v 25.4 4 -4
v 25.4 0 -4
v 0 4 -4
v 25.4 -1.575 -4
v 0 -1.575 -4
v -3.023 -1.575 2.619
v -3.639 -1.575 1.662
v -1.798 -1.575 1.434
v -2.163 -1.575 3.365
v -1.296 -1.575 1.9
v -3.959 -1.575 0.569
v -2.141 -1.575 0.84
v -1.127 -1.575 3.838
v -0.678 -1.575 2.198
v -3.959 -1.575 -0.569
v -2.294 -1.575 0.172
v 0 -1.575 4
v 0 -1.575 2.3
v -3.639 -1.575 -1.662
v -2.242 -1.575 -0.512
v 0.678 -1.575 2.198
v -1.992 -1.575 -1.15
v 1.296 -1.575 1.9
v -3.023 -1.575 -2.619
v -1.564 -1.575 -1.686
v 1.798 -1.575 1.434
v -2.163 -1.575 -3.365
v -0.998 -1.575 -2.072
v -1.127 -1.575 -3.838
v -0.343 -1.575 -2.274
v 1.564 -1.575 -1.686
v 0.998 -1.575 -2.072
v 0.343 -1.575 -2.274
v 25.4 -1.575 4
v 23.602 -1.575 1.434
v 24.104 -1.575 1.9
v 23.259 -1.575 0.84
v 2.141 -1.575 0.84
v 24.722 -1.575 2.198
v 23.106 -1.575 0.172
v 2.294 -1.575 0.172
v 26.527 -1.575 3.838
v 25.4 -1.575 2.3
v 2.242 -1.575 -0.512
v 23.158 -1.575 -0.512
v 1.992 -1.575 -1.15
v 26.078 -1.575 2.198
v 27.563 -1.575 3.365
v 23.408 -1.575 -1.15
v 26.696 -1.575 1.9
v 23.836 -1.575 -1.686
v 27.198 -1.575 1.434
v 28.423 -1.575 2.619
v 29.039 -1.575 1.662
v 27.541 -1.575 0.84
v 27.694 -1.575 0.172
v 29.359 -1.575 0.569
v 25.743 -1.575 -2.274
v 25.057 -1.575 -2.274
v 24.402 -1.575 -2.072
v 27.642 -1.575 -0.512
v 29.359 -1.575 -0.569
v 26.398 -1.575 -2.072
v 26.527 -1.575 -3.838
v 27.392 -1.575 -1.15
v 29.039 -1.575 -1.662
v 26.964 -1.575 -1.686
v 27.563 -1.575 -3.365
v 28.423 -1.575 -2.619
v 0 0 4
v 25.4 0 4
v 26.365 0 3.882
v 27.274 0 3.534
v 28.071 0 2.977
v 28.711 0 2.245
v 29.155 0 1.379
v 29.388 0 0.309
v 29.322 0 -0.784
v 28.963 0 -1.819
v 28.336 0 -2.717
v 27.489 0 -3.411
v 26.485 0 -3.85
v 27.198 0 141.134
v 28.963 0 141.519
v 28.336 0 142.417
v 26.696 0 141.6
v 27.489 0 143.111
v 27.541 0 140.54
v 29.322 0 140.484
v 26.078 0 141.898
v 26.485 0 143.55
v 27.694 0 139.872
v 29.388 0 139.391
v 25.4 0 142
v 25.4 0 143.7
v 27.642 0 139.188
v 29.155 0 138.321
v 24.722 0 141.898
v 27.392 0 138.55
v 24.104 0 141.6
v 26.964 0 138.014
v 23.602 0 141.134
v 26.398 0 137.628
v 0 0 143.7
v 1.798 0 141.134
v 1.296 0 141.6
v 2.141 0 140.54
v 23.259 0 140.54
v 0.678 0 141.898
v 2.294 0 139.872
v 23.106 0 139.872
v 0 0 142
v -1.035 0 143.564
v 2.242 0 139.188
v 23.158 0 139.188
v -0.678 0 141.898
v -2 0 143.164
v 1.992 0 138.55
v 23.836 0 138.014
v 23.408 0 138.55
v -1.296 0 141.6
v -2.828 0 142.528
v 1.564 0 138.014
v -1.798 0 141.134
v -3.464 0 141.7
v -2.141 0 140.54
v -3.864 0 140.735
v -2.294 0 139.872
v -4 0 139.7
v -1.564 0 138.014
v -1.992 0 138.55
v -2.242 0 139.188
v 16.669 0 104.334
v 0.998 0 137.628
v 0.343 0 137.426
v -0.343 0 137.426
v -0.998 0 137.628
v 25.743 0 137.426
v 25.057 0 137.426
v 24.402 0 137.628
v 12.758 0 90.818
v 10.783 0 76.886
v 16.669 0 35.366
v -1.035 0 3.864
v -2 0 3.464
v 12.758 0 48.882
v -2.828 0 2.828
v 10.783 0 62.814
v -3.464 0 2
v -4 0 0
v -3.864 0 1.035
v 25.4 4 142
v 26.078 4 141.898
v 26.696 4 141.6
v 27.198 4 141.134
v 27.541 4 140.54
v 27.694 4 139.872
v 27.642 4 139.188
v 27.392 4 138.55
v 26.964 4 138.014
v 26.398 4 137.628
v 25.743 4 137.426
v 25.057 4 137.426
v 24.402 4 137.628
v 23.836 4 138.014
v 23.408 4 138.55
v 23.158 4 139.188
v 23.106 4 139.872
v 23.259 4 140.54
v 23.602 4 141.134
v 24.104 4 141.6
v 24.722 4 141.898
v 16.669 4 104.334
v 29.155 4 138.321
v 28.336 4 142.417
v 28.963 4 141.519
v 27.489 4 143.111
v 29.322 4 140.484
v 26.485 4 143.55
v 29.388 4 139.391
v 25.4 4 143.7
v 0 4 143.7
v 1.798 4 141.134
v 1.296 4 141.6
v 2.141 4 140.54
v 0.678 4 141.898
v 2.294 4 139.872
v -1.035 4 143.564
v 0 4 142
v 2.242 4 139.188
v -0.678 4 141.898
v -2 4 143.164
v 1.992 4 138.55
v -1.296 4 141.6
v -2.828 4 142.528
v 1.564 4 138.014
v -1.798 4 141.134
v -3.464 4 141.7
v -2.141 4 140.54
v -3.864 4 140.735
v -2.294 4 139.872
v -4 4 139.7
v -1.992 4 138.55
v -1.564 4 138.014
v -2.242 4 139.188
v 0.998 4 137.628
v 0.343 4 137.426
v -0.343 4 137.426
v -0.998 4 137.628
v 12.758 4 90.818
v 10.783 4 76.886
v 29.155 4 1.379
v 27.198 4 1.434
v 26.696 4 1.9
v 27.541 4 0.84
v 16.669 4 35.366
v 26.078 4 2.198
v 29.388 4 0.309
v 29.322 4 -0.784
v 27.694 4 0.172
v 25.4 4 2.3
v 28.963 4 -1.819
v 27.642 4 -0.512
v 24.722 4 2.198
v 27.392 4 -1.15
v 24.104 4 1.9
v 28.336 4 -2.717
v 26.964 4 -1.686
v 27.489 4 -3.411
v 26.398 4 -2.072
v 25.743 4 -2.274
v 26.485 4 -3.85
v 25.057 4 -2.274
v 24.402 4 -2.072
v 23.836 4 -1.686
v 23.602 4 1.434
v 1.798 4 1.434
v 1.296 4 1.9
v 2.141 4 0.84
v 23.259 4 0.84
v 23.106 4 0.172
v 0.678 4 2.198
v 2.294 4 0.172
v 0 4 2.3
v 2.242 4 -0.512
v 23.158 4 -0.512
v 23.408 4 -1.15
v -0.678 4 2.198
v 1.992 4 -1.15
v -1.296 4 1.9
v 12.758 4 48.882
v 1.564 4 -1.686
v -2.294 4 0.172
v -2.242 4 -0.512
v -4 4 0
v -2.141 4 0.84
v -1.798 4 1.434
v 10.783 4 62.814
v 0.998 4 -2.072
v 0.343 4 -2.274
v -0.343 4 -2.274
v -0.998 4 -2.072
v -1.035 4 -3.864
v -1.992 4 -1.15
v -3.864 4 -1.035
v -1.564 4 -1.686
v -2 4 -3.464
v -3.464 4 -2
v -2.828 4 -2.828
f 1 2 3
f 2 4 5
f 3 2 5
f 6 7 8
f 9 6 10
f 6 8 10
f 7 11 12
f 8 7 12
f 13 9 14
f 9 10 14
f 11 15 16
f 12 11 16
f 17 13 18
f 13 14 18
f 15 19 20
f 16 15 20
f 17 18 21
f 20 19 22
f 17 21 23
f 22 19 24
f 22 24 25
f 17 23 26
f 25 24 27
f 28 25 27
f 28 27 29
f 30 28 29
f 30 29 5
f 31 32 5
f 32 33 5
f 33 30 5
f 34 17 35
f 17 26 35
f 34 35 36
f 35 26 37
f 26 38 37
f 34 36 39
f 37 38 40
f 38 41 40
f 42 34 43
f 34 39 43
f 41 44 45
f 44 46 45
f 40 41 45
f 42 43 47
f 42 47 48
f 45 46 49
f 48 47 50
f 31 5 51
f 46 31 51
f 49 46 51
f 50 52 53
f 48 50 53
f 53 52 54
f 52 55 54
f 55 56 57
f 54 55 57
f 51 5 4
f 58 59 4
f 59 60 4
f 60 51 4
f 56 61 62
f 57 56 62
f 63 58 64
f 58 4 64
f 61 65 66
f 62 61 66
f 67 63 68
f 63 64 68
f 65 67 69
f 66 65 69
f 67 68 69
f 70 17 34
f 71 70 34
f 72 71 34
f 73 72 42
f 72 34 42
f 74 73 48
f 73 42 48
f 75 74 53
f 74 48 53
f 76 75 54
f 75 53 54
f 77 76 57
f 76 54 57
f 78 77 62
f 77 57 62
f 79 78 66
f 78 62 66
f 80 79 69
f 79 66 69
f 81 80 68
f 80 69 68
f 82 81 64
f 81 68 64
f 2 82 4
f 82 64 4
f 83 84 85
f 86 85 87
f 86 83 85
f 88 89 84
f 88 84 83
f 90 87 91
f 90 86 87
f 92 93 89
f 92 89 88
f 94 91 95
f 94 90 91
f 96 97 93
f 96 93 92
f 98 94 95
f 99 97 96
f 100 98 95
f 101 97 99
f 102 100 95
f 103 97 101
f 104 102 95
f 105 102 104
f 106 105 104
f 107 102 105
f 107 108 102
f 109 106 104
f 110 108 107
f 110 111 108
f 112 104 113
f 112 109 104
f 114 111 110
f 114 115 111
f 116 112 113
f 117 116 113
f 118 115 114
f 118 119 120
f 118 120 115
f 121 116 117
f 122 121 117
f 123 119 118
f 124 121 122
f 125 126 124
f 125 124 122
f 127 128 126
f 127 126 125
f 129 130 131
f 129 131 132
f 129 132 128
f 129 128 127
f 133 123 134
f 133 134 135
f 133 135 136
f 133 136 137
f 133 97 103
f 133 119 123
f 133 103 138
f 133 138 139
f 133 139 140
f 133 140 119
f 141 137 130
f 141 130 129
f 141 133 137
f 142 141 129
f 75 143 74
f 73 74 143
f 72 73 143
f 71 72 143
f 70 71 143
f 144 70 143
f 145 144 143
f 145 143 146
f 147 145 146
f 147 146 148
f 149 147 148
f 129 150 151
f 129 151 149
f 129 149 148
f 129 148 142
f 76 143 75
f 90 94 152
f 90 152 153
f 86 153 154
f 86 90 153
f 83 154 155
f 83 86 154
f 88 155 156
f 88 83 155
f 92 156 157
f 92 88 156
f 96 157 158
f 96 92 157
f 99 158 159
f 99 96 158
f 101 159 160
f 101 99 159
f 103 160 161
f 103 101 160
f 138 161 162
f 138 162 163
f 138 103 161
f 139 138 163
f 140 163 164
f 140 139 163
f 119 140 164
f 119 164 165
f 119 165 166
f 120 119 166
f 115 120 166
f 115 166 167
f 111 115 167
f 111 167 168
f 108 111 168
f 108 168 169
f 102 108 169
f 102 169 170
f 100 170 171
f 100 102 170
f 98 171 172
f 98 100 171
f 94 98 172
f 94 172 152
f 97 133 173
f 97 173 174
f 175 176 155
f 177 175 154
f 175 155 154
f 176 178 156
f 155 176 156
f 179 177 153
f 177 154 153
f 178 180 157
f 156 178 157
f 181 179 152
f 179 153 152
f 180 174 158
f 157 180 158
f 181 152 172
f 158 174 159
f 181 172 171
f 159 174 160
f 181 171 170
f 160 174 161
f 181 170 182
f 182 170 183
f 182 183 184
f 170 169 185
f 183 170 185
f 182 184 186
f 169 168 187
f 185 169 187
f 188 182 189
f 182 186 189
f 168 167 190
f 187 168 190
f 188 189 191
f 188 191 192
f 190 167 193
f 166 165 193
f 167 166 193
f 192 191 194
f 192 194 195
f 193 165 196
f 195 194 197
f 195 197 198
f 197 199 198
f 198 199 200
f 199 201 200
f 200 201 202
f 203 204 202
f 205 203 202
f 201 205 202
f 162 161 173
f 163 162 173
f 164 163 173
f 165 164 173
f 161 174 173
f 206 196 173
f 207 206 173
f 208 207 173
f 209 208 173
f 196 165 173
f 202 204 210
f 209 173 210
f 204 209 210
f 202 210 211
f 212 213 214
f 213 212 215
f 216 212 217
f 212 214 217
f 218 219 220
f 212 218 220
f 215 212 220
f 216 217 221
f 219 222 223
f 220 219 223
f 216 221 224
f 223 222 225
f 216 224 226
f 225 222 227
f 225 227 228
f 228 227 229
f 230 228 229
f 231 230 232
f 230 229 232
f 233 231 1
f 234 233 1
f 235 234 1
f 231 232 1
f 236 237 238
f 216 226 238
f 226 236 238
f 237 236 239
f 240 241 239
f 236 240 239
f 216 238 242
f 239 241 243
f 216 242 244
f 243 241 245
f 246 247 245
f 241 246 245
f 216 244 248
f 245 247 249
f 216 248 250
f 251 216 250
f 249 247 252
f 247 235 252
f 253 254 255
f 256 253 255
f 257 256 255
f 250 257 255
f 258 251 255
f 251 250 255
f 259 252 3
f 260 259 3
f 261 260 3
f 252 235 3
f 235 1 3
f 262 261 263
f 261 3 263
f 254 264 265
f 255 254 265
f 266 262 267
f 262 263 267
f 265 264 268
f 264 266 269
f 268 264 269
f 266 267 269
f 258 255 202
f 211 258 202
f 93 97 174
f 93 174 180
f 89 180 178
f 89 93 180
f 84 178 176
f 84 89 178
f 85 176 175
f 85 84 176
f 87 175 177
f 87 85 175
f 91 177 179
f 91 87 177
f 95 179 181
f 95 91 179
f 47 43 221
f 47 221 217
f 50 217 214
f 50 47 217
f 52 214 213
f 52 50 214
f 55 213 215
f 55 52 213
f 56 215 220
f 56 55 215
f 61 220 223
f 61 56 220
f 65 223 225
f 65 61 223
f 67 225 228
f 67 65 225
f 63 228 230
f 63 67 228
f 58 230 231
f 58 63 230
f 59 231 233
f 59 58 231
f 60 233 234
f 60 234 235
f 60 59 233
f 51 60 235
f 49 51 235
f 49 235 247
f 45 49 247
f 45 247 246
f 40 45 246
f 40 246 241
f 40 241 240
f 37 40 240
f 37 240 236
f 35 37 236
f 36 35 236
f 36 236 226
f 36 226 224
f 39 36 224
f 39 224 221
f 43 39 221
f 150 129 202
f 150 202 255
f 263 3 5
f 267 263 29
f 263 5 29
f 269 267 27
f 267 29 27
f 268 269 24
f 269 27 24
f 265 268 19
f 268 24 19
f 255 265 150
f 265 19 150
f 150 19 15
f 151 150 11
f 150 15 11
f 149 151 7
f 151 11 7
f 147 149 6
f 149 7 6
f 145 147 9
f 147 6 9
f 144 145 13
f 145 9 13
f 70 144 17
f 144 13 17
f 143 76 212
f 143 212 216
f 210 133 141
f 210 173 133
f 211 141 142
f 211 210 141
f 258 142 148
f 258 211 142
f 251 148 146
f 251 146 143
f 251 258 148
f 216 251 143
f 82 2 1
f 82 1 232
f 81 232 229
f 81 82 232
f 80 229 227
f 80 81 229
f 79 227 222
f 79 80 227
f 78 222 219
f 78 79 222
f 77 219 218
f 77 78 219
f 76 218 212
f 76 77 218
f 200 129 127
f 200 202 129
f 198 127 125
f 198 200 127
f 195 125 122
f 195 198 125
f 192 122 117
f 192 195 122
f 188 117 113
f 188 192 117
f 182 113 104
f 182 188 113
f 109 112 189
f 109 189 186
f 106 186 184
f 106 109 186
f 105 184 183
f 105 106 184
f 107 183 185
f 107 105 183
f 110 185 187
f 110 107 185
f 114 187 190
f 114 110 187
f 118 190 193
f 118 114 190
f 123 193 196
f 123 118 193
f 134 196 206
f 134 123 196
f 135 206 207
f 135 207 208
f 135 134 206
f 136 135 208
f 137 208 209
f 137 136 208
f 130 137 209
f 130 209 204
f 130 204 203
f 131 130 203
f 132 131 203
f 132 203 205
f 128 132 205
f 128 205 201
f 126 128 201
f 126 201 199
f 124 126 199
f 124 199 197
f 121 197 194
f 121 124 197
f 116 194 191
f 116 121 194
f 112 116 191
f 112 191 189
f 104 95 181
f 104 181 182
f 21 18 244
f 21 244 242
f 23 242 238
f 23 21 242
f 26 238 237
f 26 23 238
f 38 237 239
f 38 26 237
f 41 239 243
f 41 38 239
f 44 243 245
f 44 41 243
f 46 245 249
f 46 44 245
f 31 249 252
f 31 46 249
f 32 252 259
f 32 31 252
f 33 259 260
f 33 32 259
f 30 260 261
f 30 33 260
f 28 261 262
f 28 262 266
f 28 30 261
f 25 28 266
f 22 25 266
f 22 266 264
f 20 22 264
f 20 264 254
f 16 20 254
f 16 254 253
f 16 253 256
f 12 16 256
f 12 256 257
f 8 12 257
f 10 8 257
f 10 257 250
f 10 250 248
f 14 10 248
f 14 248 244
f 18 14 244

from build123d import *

# Parameters (mm, degrees)
SKETCH1_R           = 2.3
BOSS_EXTRUDE2_DEPTH = 4
FILLET1_R           = 4
FILLET2_R           = 100
BOSS_EXTRUDE3_START = -5.575308
SKETCH2_R           = 2.3
BOSS_EXTRUDE3_DEPTH = 1.575308


with BuildPart() as part:
    # Sketch1 → Boss-Extrude2 (new body)
    with BuildSketch(Plane(origin=(0, 0, 0), x_dir=(1, 0, 0), z_dir=(0, 1, 0))):
        with BuildLine():
            Line((-4, -143.7), (-4, 4))
            Line((-4, 4), (25.4, 4))
            ThreePointArc((25.4, 4), (28.6800532, 2.289377864), (29.154640594, -1.379374498))
            Line((29.154640594, -1.379374498), (4, -69.85))
            Line((4, -69.85), (29.154640594, -138.320625502))
            ThreePointArc((29.154640594, -138.320625502), (28.6800532, -141.989377864), (25.4, -143.7))
            Line((25.4, -143.7), (-4, -143.7))
        make_face()
        with Locations(Location((0, 0, 0), (0, 0, 270))):
            Circle(SKETCH1_R, mode=Mode.SUBTRACT)
        with Locations(Location((25.4, 0, 0), (0, 0, 270))):
            Circle(SKETCH1_R, mode=Mode.SUBTRACT)
        with Locations(Location((25.4, -139.7, 0), (0, 0, 270))):
            Circle(SKETCH1_R, mode=Mode.SUBTRACT)
        with Locations(Location((0, -139.7, 0), (0, 0, 270))):
            Circle(SKETCH1_R, mode=Mode.SUBTRACT)
    extrude(amount=BOSS_EXTRUDE2_DEPTH)

    # Fillet1
    fillet1_edges = [part.edges().sort_by_distance(p)[0] for p in [
        (-4, 2, 143.7),
        (-4, 2, -4),
    ]]
    fillet(fillet1_edges, radius=FILLET1_R)

    # Fillet2
    fillet2_edges = [part.edges().sort_by_distance(p)[0] for p in [
        (4, 2, 69.85),
    ]]
    fillet(fillet2_edges, radius=FILLET2_R)

    # Sketch2 → Boss-Extrude3 (add)
    with BuildSketch(Plane(origin=(0, 4, 0), x_dir=(1, 0, 0), z_dir=(0, 1, 0)).offset(BOSS_EXTRUDE3_START)):
        with BuildLine():
            Line((0, -4), (25.4, -4))
            ThreePointArc((25.4, -4), (29.4, 0), (25.4, 4))
            Line((25.4, 4), (0, 4))
            ThreePointArc((0, 4), (-4, 0), (0, -4))
        make_face()
        with Locations(Location((0, 0, 0), (0, 0, 270))):
            Circle(SKETCH2_R, mode=Mode.SUBTRACT)
        with Locations(Location((25.4, 0, 0), (0, 0, 270))):
            Circle(SKETCH2_R, mode=Mode.SUBTRACT)
    extrude(amount=BOSS_EXTRUDE3_DEPTH)


solid = part.part
